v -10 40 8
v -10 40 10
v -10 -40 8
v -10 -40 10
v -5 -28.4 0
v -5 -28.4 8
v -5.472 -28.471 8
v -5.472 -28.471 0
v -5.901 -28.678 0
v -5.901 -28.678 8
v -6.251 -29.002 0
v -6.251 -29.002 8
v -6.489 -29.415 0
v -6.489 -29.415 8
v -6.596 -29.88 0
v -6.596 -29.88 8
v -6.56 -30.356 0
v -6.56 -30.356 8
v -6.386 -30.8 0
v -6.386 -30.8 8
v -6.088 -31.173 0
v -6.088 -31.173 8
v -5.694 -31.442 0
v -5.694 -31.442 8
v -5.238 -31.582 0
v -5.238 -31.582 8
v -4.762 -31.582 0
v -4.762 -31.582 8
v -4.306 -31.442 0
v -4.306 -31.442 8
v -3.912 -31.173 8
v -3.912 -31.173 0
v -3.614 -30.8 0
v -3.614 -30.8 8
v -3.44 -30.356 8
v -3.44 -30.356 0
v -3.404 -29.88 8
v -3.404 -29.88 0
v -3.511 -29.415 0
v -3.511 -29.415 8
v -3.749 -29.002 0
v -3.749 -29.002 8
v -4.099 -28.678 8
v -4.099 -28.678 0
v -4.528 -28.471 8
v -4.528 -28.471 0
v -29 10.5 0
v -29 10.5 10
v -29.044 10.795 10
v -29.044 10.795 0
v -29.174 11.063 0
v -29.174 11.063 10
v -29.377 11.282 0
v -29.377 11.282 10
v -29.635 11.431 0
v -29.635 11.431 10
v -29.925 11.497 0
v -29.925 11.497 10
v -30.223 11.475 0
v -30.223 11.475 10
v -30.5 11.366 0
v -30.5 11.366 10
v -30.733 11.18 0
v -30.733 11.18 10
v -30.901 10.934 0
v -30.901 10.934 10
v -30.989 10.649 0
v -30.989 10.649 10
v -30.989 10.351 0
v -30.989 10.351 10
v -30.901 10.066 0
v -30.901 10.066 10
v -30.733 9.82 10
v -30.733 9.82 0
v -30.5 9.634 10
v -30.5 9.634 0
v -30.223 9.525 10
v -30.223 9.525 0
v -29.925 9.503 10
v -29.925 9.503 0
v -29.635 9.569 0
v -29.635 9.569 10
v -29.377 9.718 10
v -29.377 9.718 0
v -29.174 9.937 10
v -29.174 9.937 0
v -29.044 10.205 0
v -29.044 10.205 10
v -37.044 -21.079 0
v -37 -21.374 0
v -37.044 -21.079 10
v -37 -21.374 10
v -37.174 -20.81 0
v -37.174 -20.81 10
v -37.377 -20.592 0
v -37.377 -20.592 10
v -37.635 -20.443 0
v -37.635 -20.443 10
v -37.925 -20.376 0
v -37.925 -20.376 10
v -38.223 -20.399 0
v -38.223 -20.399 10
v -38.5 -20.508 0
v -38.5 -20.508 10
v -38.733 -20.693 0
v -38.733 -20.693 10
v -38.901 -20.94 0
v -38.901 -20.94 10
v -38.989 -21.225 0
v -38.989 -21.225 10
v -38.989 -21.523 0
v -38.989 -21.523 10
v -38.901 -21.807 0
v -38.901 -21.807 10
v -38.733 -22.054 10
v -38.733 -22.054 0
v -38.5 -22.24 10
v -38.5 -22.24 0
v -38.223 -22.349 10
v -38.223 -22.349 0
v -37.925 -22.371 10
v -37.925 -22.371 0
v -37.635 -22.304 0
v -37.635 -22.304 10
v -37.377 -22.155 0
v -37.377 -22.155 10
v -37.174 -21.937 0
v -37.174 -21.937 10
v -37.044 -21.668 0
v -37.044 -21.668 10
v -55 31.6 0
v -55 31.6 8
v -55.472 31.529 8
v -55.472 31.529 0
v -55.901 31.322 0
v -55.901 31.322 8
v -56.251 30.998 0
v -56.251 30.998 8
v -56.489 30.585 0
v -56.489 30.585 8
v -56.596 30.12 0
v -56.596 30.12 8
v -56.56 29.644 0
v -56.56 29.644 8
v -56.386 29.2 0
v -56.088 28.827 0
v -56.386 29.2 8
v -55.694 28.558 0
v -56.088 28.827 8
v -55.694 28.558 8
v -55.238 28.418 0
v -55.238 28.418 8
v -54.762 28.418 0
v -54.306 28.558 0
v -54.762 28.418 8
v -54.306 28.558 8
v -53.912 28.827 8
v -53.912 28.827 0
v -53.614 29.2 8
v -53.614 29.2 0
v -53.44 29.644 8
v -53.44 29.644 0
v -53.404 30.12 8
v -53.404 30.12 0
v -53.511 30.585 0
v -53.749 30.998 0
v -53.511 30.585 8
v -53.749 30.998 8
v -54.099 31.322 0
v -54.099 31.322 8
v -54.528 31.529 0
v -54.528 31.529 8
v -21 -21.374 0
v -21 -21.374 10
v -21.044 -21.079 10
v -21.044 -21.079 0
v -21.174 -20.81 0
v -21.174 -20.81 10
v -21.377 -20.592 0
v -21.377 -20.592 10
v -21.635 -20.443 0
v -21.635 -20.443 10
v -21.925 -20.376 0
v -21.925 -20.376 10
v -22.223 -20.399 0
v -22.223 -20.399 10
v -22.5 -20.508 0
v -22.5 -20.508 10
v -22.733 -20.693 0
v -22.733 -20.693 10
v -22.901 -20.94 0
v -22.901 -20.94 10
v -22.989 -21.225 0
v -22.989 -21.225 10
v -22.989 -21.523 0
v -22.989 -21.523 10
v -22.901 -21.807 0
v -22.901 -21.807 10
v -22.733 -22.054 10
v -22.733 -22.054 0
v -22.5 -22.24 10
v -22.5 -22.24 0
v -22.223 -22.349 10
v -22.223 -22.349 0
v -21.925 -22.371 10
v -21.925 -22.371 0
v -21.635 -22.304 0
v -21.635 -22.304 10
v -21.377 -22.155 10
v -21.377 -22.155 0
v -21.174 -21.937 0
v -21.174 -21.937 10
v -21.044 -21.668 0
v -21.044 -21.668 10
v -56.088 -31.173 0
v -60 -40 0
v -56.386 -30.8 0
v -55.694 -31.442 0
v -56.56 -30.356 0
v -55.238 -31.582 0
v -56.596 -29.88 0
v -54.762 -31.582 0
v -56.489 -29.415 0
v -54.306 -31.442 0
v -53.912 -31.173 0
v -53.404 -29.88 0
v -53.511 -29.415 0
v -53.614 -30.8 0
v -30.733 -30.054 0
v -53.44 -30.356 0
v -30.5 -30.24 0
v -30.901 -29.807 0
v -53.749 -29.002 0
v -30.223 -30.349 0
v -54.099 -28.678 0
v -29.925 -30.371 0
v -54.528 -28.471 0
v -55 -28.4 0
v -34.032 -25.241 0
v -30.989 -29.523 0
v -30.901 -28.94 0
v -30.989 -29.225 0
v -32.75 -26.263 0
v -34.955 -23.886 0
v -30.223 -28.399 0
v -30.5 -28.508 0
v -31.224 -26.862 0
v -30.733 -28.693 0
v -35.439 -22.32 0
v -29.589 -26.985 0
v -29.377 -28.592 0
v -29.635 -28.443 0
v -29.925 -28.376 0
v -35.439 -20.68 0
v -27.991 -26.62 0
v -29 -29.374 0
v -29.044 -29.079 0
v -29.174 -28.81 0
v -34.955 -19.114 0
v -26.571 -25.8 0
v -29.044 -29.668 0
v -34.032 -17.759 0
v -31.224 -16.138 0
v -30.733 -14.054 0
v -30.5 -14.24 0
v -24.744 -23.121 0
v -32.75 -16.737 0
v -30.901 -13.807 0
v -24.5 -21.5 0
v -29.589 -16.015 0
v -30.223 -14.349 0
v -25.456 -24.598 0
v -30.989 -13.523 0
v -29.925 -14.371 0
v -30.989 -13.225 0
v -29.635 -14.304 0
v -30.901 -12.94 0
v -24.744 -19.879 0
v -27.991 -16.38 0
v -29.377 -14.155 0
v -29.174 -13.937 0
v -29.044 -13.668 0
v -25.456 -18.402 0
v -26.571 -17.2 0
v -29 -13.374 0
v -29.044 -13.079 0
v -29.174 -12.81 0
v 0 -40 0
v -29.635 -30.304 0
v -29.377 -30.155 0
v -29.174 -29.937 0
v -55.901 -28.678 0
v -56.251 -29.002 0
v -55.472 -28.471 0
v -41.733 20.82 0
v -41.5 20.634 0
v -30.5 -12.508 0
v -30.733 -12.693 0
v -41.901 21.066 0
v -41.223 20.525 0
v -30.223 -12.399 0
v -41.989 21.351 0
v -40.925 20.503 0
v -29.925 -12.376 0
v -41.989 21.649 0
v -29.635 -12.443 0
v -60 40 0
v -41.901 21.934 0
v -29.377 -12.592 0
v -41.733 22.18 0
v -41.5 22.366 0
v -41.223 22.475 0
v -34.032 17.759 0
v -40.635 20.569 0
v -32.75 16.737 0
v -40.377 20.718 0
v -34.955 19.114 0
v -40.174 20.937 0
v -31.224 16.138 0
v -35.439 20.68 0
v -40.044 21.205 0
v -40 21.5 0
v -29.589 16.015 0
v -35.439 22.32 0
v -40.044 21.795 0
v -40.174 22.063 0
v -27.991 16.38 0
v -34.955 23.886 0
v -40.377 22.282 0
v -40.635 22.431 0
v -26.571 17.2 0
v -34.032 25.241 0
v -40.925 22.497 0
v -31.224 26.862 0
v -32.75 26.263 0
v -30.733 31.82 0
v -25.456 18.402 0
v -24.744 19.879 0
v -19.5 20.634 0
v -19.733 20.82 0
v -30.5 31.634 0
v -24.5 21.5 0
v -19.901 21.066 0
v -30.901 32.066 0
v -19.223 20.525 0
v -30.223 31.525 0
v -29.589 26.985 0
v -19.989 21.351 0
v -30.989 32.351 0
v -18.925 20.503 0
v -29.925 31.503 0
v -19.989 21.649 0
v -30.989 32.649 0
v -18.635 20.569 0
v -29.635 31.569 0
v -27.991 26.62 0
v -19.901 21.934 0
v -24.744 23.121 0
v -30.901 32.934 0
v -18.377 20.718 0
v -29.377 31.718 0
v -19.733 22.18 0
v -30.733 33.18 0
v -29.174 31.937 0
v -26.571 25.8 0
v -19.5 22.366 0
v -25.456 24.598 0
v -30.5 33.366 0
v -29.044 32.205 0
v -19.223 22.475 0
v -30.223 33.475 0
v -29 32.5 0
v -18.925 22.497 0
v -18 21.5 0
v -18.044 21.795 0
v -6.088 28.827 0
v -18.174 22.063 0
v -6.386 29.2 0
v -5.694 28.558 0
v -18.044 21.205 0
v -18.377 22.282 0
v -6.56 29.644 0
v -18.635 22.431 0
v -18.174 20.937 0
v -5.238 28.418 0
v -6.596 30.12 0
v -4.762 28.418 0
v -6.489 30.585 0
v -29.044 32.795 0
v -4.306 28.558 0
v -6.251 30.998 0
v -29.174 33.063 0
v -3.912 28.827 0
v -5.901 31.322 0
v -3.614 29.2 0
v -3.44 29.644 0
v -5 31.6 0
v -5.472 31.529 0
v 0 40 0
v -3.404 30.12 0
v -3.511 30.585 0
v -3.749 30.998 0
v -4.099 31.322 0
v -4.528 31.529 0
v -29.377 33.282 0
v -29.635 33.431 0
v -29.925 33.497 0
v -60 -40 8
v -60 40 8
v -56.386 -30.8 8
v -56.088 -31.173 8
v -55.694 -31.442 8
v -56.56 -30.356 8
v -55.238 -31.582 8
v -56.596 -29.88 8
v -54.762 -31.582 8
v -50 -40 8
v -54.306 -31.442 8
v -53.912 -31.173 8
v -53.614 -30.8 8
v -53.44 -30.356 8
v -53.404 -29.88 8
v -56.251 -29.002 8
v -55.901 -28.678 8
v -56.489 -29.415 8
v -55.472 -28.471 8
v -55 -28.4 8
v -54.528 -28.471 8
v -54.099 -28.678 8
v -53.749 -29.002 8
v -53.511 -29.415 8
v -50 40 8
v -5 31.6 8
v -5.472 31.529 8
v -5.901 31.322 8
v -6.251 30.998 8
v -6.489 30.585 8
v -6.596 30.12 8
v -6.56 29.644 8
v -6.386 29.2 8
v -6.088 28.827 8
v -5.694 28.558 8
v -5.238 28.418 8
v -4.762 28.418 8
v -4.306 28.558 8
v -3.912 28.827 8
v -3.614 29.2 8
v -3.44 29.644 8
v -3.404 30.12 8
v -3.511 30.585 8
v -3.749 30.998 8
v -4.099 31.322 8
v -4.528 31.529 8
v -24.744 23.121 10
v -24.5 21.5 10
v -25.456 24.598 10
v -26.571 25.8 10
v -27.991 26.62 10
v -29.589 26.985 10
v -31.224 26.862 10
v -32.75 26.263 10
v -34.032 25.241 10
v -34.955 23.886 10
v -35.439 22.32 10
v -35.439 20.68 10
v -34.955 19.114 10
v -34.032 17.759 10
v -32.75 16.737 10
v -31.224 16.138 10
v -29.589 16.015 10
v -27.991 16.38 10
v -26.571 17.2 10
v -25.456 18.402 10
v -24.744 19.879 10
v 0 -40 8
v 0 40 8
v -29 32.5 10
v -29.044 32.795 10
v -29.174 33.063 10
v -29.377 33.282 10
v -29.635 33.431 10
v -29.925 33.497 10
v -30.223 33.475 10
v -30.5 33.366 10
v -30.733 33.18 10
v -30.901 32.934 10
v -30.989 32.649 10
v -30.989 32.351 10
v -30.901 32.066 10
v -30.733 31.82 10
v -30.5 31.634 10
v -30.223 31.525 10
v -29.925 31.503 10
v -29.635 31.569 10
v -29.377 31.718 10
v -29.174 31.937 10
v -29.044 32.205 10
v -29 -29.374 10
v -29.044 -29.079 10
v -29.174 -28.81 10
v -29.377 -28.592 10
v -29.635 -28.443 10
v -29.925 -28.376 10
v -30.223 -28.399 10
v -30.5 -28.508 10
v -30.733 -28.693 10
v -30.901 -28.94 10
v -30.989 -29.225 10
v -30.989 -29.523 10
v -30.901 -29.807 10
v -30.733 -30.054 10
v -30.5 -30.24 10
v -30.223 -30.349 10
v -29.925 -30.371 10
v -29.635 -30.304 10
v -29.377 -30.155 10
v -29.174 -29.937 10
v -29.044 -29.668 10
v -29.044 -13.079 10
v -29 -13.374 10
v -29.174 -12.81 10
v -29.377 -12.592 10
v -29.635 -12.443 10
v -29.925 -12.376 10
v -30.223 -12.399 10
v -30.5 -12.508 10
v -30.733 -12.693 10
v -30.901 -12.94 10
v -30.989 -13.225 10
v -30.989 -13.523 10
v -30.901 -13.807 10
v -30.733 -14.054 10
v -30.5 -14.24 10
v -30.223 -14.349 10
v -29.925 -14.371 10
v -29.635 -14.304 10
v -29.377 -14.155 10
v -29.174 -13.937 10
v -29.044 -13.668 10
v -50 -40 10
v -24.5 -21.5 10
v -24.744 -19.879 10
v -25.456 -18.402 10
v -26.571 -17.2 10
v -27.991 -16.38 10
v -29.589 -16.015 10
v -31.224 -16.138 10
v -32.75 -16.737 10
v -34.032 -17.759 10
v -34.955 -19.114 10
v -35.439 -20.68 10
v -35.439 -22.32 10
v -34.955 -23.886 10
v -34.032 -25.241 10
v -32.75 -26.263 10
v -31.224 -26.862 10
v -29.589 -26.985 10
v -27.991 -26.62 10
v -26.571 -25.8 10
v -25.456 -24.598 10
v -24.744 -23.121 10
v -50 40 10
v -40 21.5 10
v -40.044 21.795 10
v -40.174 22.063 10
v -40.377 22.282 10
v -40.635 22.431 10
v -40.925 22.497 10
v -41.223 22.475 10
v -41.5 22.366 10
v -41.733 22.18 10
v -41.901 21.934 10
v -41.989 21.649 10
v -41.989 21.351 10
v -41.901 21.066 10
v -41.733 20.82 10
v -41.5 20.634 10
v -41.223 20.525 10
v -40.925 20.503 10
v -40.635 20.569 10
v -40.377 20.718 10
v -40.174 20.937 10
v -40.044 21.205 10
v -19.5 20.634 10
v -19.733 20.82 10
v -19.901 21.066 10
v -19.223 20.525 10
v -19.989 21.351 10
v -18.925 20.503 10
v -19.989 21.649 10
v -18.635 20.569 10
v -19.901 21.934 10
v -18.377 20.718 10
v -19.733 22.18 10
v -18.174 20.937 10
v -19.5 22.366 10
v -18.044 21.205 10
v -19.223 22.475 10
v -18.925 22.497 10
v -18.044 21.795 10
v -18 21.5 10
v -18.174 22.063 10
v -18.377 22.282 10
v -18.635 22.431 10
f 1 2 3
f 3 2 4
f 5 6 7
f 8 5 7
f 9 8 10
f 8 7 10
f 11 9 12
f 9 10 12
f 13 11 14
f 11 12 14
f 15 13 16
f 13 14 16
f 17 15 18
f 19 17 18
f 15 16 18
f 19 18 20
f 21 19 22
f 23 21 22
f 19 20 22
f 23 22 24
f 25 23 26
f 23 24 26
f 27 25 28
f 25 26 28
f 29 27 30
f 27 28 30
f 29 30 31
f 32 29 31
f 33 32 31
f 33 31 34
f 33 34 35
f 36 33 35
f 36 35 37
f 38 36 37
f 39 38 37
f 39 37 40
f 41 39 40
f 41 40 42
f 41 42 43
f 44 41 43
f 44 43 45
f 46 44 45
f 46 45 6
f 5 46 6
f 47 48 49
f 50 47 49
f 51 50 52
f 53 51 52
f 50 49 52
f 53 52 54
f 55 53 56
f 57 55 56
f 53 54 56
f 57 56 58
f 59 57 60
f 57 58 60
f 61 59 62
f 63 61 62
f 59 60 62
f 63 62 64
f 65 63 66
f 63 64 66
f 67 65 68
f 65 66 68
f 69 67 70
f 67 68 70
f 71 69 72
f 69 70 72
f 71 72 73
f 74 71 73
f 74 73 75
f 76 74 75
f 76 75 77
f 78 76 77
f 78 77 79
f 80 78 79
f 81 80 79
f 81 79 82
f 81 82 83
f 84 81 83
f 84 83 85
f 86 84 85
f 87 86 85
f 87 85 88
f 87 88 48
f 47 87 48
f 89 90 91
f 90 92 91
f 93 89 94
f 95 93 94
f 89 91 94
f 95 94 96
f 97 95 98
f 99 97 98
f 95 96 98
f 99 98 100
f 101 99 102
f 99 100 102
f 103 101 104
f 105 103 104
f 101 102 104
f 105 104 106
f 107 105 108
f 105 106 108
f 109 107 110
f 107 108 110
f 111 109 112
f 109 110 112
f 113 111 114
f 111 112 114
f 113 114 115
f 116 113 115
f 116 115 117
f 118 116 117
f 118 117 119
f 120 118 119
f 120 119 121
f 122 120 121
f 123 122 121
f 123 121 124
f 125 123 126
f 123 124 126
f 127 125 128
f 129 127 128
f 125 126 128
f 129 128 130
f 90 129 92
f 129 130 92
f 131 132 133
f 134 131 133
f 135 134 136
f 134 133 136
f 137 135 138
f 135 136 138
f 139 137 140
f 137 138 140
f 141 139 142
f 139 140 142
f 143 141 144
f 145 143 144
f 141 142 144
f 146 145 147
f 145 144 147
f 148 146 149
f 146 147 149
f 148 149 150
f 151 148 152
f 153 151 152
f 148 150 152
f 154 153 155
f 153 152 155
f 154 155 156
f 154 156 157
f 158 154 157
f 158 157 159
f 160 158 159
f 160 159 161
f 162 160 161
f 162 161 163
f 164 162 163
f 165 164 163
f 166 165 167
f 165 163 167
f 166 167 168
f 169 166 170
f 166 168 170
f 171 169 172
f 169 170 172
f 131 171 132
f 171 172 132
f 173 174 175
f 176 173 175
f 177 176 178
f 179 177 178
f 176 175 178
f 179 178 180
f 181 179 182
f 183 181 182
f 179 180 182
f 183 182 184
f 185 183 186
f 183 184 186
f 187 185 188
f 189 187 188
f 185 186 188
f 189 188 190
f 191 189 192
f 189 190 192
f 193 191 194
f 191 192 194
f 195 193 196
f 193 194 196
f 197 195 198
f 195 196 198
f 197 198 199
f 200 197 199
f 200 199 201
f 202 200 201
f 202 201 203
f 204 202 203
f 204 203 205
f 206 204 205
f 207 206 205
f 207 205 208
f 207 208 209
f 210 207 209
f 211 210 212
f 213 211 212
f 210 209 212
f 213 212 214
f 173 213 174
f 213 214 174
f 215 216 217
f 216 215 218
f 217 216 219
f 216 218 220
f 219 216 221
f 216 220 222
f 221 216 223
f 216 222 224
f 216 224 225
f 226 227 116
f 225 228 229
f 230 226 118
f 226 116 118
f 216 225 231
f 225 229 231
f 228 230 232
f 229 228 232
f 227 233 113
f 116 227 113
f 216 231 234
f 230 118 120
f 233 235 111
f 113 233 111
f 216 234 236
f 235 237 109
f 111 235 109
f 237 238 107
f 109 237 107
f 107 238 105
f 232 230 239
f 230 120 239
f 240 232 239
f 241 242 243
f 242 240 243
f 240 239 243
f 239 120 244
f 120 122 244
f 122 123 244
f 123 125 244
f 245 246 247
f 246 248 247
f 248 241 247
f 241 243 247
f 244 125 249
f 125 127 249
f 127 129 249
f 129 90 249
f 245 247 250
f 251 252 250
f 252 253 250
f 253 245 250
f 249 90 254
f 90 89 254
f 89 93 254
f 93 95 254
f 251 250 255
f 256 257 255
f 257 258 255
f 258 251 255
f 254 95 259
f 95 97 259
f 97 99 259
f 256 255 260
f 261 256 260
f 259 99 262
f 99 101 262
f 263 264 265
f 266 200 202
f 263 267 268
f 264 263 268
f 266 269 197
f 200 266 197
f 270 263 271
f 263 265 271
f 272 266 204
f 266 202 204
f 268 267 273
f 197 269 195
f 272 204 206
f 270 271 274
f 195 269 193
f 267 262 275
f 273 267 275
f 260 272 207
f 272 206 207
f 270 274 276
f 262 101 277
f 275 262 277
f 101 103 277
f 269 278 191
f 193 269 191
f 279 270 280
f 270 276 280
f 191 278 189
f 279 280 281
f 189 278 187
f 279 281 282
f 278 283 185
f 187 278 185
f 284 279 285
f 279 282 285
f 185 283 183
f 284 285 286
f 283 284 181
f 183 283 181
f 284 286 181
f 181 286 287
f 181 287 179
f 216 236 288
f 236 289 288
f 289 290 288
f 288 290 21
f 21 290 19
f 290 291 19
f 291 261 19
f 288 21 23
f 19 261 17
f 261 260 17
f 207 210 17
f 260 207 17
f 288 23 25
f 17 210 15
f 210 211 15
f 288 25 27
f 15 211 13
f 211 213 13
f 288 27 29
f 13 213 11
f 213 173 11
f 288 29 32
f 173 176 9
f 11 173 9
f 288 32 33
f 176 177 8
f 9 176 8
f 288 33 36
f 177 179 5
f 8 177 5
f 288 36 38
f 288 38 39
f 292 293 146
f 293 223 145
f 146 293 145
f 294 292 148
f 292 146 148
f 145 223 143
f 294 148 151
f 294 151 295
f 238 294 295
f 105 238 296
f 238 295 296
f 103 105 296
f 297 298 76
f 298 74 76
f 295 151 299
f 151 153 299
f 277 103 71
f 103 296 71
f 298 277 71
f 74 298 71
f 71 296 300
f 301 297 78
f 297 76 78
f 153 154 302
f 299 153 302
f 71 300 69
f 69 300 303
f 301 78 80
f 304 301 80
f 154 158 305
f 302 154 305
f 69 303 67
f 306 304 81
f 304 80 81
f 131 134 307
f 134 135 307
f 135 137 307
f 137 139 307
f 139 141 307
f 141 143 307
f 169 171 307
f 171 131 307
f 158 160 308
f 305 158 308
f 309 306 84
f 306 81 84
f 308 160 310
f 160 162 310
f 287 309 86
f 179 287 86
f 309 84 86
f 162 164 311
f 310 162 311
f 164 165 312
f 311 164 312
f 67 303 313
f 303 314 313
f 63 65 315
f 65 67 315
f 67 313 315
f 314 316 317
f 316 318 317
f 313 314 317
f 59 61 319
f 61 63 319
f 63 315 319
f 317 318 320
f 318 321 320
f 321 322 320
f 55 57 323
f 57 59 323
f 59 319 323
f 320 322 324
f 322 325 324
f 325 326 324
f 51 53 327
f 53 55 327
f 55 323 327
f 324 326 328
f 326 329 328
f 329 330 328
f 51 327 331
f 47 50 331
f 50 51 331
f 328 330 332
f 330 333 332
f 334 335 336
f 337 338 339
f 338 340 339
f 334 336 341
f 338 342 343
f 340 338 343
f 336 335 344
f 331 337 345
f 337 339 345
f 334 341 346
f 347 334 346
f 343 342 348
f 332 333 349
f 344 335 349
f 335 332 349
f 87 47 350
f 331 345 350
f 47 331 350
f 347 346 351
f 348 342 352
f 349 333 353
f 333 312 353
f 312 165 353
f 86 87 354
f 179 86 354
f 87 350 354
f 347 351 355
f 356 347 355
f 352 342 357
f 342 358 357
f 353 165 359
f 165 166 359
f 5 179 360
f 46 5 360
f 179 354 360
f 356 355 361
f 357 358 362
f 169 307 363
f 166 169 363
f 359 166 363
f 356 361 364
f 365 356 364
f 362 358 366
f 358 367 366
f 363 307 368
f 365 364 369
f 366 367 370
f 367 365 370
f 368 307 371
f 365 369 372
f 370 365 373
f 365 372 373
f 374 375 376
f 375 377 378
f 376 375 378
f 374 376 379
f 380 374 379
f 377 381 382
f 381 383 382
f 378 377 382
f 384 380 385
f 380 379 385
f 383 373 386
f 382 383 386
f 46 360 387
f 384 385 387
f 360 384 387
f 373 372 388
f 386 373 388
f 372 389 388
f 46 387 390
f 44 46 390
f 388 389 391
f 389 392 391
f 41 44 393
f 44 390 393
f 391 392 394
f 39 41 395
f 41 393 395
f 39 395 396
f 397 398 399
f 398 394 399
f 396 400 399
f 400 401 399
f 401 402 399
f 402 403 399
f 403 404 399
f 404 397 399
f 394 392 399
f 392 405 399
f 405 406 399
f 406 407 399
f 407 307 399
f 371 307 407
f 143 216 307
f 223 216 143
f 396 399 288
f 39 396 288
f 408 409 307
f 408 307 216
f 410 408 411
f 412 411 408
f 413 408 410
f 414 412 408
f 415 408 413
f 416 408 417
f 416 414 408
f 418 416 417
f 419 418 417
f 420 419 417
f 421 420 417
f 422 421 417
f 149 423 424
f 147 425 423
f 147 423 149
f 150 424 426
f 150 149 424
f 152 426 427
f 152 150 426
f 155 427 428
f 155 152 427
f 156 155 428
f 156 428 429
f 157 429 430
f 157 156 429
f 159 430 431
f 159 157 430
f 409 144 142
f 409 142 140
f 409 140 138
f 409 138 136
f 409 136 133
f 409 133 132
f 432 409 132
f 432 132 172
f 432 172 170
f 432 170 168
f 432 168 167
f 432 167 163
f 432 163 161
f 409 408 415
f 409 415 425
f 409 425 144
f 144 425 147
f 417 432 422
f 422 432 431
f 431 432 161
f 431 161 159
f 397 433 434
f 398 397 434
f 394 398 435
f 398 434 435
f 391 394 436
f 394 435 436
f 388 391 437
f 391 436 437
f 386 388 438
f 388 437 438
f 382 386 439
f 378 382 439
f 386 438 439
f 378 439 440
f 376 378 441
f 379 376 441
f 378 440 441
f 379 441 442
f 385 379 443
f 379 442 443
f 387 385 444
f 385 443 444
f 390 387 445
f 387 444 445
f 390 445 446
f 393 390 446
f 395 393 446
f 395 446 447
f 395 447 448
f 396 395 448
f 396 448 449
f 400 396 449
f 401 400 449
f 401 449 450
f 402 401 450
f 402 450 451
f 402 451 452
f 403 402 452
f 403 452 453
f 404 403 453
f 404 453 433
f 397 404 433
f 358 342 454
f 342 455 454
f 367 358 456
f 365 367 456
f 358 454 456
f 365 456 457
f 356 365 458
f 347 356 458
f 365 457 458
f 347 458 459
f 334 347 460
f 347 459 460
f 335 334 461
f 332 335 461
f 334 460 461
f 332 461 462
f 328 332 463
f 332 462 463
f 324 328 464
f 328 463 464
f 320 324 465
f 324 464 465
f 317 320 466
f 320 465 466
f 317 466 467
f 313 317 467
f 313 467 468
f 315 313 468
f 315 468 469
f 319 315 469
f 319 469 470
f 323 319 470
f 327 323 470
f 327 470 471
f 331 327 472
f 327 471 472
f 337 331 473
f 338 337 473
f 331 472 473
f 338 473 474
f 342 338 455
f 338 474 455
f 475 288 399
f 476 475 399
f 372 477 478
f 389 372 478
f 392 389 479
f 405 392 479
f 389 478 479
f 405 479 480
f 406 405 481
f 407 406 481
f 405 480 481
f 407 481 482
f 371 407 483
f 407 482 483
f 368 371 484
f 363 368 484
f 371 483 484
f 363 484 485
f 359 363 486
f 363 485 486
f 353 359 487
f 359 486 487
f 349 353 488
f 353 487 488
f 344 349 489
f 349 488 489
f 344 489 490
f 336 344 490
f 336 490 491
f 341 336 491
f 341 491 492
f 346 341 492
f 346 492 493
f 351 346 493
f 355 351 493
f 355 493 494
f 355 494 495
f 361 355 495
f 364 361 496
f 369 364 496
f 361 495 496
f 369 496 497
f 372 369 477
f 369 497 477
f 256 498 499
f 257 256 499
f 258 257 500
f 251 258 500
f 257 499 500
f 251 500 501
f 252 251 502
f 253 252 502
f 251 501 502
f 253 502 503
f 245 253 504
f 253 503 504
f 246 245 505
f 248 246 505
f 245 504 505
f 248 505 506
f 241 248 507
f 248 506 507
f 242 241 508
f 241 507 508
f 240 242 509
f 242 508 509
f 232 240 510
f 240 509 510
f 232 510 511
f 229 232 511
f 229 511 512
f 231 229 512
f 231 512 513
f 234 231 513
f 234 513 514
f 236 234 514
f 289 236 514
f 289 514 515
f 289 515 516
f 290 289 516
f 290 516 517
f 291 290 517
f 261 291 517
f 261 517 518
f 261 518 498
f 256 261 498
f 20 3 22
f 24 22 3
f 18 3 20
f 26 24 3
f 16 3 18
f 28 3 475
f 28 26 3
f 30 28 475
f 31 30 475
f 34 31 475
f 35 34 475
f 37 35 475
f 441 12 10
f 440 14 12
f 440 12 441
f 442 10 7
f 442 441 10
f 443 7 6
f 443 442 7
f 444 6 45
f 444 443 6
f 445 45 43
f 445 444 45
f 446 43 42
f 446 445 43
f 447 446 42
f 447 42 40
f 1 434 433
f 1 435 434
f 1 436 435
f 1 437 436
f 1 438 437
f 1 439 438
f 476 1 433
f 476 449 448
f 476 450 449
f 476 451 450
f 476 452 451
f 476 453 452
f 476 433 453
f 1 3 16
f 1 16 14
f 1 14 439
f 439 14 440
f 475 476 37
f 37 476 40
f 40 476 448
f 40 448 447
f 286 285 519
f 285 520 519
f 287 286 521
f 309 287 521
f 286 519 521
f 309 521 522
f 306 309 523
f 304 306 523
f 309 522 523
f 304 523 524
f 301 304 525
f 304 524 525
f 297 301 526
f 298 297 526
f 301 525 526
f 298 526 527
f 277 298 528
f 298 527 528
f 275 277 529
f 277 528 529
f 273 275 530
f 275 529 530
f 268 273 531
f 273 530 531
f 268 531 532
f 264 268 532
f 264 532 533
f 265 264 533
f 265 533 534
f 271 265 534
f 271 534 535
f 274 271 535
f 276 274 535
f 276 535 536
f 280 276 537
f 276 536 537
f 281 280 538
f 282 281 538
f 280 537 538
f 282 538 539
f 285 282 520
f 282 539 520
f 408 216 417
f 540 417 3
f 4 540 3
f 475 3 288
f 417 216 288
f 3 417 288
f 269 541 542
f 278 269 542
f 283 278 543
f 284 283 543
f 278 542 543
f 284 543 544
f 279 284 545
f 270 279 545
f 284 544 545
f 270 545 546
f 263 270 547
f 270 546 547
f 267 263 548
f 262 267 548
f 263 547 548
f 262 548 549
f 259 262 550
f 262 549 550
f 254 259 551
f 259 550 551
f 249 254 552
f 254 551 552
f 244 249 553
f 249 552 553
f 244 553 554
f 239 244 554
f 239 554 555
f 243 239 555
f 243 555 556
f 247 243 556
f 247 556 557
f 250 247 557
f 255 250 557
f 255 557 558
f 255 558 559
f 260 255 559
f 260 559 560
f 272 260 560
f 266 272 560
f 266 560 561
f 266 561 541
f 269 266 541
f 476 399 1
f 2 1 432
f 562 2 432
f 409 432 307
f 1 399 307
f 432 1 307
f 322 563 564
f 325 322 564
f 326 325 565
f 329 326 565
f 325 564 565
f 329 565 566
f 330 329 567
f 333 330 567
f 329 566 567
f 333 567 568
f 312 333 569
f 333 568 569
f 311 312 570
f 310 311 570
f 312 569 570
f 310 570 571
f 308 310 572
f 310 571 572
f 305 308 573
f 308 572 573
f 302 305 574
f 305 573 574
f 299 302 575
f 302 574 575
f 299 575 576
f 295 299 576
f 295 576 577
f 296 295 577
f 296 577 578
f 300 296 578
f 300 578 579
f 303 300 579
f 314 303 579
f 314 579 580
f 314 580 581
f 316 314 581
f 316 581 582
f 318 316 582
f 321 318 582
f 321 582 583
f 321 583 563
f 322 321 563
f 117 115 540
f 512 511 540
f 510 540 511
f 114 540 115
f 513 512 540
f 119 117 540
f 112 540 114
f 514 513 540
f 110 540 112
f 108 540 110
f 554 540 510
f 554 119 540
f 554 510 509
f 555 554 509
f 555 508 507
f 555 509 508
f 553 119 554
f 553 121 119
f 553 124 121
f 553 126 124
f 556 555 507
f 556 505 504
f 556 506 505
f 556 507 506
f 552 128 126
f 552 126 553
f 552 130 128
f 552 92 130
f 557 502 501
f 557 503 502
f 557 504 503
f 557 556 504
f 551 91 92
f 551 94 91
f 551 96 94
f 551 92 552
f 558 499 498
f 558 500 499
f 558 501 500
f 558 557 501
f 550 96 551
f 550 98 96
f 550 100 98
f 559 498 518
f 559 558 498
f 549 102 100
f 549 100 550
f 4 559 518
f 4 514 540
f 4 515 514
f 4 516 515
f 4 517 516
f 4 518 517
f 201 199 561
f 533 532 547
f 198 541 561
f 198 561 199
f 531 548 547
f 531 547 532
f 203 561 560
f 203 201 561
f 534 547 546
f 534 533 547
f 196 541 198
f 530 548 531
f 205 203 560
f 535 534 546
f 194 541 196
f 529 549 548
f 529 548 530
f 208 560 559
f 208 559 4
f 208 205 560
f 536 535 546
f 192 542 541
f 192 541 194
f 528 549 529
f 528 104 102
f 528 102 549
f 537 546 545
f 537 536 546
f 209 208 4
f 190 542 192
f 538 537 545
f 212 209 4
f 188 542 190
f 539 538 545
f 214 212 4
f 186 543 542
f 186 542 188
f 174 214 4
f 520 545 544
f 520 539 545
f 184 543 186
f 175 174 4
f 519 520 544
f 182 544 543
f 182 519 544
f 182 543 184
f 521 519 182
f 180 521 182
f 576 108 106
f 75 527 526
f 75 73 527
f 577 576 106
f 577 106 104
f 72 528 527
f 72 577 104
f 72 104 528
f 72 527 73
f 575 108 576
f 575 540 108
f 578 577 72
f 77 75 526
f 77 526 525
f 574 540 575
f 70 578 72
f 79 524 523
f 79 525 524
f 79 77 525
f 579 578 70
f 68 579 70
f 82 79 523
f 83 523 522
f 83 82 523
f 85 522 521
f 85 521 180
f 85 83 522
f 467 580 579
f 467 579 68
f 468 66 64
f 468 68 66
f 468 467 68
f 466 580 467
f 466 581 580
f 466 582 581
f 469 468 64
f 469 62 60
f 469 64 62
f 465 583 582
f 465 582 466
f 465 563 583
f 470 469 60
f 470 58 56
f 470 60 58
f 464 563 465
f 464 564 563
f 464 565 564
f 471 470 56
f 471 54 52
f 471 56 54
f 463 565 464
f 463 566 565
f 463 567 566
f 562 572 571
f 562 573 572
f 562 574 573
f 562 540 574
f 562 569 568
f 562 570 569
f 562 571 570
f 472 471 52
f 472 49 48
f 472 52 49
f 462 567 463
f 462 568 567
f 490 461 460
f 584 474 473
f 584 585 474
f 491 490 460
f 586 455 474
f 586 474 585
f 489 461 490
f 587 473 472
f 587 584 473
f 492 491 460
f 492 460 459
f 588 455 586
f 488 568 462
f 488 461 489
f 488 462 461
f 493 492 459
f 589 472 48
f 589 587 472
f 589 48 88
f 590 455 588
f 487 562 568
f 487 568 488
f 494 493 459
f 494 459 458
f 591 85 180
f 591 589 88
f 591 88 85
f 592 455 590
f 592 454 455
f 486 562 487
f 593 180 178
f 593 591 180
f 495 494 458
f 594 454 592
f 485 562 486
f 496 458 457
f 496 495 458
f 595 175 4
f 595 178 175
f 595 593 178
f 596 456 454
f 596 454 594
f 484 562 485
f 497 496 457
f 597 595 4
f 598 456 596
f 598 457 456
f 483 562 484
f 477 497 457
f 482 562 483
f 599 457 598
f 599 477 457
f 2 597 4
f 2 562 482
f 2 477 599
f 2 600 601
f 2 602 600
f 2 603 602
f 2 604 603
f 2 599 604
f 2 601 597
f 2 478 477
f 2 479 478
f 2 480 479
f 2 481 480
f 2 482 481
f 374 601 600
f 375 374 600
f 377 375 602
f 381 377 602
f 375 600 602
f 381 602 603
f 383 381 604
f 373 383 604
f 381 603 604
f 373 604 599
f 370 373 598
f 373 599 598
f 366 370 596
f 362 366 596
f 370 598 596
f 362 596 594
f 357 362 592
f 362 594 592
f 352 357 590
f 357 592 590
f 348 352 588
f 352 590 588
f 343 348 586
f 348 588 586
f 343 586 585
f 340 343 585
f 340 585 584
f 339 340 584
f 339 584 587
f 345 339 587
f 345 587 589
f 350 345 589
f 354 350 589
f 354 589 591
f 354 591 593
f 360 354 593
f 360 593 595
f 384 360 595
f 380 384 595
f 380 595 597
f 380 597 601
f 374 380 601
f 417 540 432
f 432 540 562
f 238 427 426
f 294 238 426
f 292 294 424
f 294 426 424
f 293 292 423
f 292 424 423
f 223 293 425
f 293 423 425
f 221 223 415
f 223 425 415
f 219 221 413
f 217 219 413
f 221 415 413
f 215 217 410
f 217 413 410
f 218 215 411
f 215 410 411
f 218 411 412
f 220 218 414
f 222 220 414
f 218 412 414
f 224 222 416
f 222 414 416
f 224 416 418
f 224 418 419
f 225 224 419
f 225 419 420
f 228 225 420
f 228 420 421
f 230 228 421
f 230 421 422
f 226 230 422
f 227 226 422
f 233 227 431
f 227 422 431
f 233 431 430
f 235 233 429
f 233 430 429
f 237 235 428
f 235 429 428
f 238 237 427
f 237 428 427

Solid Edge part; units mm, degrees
sketch "Sketch1" plane through (0, 0, 0) normal (0, 0, 1) x (1, 0, 0)
  line L0 (0, 40) -> (-100, 40)
  line L1 (-100, 40) -> (-100, -40)
  line L2 (-100, -40) -> (0, -40)
  line L3 (0, -40) -> (0, 40)
  dimension "D1" = 80
  dimension "D2" = 100
extrude "Protrusion1" add sketch "Sketch1" along normal blind 10
sketch "Sketch2" plane through (-30, 0, 10) normal (0, 0, 1) x (1, 0, 0)
  circle A0 centre (0, 21.5) radius 5.5
  circle A1 centre (0, -21.5) radius 5.5
  dimension "D1" = 43
  dimension "D2" = 11
  dimension "D3" = 11
  dimension "D4" = 30
extrude "Cutout1" cut sketch "Sketch2" against normal through all
sketch "Sketch3" plane through (-40, 0, 10) normal (0, 0, 1) x (1, 0, 0)
  circle A0 centre (10, 32.5) radius 1
  circle A1 centre (-1, 21.5) radius 1
  circle A2 centre (10, 10.5) radius 1
  circle A3 centre (21, 21.5) radius 1
  dimension "D1" = 22
extrude "Cutout2" cut sketch "Sketch3" against normal through all
sketch "Sketch4" plane through (-40, 0, 10) normal (0, 0, 1) x (1, 0, 0)
  circle A0 centre (2, -21.3736) radius 1
  circle A1 centre (10, -13.3736) radius 1
  circle A2 centre (18, -21.3736) radius 1
  circle A3 centre (10, -29.3736) radius 1
  dimension "D1" = 2
  dimension "D2" = 16
extrude "Cutout3" cut sketch "Sketch4" against normal through all
sketch "Sketch5" plane through (-40, 0, 10) normal (0, 0, 1) x (1, 0, 0)
  line L0 (40, 40) -> (30, 40)
  line L1 (30, 40) -> (30, -40)
  line L2 (30, -40) -> (40, -40)
  line L3 (40, -40) -> (40, 40)
extrude "Extrusionsausschnitt_4" cut sketch "Sketch5" against normal blind 2
sketch "Sketch6" plane through (-5, 0, 8) normal (0, 0, 1) x (0, 1, 0)
  circle A0 centre (-30, 0) radius 1.6
  circle A1 centre (30, 0) radius 1.6
  dimension "D1" = 60
  dimension "D2" = 3.2
extrude "Cutout4" cut sketch "Sketch6" against normal through all
sketch "Sketch7" plane through (-55, 0, 10) normal (0, 0, 1) x (0, -1, 0)
  line L0 (40, -45) -> (-40, -45)
  line L1 (-40, -45) -> (-40, -5)
  line L2 (-40, -5) -> (40, -5)
  line L3 (40, -5) -> (40, -45)
  dimension "D1" = 30
extrude "Cutout5" cut sketch "Sketch7" against normal through all
mirror "Mirror1" about plane through (-30, 0, 0) normal (1, 0, 0) of "Cutout4", "Extrusionsausschnitt_4"
properties material "Nylon, allgemein"
